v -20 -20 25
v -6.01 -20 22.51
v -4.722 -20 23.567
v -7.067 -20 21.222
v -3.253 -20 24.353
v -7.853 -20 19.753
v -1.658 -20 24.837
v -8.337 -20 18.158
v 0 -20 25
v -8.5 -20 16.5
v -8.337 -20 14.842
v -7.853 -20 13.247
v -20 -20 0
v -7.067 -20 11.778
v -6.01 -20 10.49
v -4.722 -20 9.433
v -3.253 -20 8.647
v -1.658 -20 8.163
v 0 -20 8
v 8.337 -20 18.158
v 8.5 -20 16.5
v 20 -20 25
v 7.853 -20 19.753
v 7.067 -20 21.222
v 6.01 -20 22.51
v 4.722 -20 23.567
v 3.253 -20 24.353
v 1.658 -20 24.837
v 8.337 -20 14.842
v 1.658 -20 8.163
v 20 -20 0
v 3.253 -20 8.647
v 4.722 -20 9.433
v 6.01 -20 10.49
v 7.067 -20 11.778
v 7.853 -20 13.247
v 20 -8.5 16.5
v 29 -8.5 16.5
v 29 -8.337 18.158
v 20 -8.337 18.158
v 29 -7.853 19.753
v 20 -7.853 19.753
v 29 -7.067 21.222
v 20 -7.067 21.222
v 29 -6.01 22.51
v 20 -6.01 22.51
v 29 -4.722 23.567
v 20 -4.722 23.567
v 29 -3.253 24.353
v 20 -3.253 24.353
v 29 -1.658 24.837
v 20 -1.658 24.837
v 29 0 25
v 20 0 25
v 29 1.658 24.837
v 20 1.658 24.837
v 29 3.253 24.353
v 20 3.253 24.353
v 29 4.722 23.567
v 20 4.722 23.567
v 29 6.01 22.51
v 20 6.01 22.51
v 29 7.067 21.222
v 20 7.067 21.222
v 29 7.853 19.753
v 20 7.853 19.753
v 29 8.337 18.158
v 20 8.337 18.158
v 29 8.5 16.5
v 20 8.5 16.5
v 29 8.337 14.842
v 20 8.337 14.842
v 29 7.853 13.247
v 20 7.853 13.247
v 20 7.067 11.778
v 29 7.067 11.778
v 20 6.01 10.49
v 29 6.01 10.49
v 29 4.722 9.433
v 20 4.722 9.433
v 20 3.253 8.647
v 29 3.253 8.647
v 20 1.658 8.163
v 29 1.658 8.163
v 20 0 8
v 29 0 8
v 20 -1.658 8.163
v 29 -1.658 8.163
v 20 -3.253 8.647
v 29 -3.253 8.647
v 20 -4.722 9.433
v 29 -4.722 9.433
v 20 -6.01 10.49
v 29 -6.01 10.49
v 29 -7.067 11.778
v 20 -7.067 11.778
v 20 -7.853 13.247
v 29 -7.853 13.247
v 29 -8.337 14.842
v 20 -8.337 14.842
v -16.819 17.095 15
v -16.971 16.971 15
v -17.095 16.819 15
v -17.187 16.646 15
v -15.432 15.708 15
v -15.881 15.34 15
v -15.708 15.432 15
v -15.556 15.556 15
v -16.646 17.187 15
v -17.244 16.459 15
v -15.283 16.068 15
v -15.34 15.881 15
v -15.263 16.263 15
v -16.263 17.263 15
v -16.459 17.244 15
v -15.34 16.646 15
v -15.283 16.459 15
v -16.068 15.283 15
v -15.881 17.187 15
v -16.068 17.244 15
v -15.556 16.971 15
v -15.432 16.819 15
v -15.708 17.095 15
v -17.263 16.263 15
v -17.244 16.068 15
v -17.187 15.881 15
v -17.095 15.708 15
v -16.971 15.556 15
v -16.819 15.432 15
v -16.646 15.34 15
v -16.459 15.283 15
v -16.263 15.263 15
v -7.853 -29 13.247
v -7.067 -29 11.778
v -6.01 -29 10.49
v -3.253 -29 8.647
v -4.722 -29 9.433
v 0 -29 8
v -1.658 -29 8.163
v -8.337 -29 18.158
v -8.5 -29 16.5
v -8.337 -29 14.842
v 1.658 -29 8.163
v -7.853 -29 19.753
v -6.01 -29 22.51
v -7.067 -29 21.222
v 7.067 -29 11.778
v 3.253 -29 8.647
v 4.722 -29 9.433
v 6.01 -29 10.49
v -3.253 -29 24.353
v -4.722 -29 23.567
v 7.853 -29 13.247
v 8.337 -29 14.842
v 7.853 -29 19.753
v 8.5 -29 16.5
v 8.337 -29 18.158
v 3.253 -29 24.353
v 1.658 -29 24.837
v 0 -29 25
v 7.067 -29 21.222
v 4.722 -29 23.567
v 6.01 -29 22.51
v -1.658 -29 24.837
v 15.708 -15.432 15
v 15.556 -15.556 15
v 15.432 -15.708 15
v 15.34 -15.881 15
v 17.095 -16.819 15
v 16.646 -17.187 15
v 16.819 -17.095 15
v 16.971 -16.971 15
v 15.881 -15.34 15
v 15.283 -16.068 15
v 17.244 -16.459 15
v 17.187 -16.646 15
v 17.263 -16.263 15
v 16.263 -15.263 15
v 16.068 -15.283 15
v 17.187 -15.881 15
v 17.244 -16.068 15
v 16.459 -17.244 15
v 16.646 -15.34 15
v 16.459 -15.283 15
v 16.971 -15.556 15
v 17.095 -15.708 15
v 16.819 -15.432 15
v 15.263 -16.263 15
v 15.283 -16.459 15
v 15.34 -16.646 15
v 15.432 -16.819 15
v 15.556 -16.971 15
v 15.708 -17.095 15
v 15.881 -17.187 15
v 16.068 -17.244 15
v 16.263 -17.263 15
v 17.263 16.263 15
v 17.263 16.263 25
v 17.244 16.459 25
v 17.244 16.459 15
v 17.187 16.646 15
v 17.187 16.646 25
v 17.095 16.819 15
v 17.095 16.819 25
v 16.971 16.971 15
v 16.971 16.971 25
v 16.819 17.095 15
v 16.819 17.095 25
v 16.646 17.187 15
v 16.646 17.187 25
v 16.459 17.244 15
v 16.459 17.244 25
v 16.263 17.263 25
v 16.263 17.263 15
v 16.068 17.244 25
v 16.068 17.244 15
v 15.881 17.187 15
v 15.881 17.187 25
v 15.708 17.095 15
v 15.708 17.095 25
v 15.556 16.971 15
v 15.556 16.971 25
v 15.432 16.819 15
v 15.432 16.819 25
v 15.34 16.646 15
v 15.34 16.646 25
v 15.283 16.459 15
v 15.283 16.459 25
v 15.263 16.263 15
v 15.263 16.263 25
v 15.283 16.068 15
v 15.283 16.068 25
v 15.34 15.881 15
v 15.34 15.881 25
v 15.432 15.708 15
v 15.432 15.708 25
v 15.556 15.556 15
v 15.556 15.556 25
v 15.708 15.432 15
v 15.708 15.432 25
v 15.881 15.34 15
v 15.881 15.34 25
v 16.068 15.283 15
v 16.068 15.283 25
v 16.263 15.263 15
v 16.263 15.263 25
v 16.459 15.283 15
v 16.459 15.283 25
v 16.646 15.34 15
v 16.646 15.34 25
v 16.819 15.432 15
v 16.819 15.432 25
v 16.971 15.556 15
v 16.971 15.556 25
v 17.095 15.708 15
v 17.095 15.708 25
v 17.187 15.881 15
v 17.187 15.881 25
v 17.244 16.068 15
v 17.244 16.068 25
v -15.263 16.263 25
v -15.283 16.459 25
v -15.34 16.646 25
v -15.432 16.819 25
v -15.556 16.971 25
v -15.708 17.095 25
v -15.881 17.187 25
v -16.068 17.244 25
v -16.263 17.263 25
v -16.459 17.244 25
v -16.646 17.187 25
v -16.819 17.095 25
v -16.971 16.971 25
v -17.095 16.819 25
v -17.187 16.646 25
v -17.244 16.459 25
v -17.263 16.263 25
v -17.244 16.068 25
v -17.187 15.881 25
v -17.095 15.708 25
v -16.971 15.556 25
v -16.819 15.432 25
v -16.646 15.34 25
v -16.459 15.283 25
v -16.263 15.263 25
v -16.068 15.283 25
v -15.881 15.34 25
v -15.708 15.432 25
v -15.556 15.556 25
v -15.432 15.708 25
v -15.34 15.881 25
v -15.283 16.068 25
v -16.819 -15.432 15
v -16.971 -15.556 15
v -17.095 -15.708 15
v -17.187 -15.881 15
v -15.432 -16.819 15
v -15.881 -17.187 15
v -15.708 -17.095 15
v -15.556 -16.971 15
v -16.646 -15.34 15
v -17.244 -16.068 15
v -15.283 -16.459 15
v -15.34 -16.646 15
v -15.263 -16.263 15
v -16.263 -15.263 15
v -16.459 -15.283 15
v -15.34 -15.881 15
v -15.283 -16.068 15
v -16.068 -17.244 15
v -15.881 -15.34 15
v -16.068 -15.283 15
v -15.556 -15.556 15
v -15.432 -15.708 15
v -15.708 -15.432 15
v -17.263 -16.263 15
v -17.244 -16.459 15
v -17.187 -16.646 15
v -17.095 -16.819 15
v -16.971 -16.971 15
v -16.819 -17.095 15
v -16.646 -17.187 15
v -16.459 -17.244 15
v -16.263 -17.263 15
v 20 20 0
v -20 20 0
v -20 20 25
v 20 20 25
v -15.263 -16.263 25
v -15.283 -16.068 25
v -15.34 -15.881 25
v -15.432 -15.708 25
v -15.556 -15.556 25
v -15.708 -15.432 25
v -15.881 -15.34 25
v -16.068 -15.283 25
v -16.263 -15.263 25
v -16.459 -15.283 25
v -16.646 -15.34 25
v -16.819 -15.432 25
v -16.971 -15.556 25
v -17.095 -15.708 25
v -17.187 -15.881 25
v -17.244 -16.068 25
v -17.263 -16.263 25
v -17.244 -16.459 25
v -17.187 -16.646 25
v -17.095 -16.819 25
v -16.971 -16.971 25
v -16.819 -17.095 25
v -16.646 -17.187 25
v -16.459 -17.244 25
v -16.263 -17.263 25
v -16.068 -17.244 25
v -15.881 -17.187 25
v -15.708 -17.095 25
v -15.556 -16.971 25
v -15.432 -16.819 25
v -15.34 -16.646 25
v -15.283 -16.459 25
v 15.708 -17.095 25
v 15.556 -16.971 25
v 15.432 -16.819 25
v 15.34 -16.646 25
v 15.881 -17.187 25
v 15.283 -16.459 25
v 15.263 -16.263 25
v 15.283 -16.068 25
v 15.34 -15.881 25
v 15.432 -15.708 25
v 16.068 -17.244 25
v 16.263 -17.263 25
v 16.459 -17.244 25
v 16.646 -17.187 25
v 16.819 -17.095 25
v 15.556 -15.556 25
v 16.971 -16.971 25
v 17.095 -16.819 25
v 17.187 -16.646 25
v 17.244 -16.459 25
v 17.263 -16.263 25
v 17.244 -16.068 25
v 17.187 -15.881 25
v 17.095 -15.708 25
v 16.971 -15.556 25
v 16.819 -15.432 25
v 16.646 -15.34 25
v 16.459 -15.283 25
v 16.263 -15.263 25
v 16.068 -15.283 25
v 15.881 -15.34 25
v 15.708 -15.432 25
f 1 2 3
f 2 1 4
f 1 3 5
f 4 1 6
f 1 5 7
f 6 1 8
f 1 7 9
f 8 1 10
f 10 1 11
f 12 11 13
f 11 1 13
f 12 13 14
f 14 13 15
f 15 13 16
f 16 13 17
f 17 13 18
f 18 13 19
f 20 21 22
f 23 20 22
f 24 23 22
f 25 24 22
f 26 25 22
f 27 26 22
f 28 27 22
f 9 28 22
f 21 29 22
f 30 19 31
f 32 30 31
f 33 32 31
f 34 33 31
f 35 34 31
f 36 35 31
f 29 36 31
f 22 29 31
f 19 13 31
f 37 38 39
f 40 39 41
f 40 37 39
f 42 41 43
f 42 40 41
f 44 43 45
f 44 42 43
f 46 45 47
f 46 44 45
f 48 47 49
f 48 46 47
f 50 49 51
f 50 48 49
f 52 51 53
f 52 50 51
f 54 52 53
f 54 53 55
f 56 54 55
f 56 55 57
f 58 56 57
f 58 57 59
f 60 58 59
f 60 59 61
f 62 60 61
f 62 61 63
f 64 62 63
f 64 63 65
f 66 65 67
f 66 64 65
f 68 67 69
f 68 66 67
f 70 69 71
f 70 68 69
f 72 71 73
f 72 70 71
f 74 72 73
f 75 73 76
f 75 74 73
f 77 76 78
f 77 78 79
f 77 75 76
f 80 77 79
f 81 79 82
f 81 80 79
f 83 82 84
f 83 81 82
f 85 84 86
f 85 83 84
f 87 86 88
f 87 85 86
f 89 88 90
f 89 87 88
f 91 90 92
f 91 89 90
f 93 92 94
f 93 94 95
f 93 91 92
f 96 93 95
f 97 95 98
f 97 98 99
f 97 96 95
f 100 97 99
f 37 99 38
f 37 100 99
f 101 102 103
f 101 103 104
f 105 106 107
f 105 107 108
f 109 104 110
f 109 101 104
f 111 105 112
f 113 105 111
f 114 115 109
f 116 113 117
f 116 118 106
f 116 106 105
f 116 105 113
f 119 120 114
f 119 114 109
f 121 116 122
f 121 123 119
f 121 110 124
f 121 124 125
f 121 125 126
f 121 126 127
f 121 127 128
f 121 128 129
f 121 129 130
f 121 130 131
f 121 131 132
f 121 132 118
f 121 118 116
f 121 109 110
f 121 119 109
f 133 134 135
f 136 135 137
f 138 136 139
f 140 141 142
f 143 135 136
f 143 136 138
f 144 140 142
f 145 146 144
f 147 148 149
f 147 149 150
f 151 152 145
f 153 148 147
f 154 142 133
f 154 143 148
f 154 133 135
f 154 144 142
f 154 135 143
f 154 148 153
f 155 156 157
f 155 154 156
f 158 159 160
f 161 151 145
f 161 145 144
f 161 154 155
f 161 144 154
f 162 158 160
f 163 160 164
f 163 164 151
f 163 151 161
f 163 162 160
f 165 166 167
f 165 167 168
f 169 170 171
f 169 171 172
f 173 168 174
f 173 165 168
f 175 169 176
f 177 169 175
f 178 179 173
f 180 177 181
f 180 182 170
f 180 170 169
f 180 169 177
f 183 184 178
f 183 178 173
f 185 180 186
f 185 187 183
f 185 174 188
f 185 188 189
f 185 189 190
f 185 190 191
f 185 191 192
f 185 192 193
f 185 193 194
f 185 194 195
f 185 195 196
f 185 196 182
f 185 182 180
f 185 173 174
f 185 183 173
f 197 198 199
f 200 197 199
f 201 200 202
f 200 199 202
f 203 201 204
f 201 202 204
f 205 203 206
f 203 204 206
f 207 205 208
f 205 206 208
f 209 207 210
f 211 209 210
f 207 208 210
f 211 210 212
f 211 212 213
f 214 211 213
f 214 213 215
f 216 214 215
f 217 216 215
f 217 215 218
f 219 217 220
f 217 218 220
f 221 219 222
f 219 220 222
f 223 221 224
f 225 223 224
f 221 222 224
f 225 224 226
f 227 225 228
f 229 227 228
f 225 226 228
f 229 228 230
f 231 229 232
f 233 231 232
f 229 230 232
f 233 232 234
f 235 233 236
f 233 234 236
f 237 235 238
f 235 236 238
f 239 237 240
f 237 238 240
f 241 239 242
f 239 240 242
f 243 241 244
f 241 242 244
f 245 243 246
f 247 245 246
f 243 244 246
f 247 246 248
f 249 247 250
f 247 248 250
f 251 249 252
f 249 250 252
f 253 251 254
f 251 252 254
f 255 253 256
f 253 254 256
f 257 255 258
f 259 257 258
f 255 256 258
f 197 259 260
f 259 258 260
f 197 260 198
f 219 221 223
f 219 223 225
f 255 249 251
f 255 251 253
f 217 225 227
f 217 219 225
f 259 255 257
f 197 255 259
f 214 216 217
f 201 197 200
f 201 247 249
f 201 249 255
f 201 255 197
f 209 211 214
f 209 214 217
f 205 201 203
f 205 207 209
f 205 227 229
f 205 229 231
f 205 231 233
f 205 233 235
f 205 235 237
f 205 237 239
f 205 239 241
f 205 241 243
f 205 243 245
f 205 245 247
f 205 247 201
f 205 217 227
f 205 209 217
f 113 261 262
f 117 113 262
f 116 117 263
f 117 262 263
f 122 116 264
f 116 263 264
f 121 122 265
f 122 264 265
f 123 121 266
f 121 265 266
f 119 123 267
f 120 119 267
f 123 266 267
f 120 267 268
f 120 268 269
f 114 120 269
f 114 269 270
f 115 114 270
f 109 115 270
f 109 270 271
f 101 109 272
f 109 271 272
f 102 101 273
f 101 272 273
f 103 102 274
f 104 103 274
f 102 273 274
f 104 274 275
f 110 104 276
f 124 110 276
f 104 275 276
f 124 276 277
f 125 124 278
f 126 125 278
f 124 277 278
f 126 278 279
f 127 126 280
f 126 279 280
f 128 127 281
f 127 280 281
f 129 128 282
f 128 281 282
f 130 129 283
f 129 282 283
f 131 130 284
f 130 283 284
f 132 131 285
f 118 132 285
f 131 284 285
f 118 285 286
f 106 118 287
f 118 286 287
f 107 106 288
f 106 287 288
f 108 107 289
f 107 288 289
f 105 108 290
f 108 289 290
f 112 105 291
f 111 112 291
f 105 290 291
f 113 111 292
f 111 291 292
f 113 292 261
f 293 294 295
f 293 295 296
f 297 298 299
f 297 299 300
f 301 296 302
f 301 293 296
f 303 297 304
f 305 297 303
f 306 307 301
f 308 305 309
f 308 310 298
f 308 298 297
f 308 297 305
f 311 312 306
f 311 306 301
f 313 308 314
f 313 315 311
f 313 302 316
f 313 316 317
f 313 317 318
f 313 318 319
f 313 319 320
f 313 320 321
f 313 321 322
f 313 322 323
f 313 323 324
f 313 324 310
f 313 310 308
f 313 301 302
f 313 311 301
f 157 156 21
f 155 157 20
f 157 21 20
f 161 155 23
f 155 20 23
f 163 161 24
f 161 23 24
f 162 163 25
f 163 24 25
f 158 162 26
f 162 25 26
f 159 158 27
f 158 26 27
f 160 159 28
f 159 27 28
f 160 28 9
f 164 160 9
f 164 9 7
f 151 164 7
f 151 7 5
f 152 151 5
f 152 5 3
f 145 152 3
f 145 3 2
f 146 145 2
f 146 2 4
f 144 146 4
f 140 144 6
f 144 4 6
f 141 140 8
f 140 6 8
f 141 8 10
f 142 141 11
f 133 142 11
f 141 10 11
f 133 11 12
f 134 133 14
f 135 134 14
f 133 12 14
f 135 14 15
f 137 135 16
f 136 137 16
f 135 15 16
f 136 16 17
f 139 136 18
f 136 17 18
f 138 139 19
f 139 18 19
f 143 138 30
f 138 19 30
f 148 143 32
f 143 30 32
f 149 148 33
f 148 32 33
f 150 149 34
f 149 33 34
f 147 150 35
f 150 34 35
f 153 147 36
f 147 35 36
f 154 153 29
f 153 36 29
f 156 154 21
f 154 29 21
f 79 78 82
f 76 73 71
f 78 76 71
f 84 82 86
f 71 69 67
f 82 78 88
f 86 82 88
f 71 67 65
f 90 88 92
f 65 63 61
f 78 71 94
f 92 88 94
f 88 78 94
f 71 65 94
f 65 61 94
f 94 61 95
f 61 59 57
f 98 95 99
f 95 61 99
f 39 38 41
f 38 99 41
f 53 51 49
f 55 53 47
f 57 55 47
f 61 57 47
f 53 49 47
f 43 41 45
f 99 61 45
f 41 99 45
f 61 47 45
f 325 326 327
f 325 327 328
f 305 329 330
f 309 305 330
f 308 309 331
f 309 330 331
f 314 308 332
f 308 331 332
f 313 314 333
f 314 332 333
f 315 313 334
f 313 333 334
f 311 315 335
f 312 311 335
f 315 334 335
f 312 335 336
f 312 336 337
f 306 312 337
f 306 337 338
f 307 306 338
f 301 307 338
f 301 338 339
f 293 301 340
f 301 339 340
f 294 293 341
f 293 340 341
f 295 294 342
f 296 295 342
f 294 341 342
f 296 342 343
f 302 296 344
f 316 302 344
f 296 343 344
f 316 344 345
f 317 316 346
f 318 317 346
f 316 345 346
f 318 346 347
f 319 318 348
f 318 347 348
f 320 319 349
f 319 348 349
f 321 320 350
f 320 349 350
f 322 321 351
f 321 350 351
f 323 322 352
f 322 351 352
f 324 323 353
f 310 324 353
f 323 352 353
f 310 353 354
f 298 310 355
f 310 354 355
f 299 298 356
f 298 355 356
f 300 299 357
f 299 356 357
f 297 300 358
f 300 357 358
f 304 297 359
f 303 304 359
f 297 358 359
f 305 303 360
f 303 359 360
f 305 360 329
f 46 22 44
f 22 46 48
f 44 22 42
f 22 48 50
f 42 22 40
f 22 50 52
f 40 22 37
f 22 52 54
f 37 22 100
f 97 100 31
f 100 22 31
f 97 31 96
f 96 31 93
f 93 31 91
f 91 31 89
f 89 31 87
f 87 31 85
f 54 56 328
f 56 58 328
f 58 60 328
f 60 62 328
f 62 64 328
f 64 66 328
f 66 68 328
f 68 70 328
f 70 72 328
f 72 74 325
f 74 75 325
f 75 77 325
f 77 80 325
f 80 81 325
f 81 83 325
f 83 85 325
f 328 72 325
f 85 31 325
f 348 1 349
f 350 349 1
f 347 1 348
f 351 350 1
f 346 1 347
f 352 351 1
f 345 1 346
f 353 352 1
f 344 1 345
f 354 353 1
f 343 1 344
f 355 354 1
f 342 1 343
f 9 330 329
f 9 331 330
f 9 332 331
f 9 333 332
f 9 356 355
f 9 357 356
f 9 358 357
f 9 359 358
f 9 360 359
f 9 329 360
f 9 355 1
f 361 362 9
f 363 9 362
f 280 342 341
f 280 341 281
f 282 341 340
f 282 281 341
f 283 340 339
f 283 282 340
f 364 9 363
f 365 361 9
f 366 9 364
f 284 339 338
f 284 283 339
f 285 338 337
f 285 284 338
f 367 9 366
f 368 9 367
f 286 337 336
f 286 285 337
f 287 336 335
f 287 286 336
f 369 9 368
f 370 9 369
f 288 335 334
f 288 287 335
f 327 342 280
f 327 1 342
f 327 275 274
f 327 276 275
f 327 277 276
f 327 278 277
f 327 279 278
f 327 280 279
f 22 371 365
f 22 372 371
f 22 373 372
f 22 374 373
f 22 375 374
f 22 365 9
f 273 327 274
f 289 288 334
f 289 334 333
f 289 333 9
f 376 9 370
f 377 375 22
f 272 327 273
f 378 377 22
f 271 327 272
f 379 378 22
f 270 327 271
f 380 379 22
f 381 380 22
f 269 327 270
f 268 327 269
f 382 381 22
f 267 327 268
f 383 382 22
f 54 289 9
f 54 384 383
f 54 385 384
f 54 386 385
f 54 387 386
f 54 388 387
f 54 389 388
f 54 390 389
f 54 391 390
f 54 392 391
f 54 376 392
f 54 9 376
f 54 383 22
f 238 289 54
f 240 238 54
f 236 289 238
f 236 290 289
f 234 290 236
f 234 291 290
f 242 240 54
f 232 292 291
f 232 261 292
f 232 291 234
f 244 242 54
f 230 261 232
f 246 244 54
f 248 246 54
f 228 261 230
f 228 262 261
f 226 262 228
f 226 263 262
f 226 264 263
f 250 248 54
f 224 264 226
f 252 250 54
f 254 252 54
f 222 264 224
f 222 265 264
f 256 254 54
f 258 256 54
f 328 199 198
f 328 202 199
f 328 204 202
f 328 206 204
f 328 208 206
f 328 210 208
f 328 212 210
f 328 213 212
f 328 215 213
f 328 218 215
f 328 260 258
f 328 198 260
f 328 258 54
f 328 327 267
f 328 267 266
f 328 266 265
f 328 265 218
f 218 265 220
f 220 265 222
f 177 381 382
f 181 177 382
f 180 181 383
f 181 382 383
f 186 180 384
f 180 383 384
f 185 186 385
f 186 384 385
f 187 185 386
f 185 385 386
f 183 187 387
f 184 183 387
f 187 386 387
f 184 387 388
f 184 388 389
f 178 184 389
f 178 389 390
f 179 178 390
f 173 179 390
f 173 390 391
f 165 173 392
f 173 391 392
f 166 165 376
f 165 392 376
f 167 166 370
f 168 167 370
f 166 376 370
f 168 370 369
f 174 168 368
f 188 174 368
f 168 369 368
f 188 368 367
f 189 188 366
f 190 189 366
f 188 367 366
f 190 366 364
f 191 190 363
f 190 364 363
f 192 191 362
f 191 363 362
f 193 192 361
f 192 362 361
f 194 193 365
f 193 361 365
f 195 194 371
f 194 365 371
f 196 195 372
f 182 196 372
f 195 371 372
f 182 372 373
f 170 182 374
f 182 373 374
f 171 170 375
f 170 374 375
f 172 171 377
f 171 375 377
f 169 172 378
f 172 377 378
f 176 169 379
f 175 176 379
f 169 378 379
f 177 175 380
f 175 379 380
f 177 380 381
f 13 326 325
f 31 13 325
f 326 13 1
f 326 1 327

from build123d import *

# Parameters (mm, degrees)
SKETCH1_W           = 40
SKETCH1_H           = 40
BOSS_EXTRUDE1_DEPTH = 25
SKETCH2_R           = 8.5
BOSS_EXTRUDE2_DEPTH = 9
SKETCH3_R           = 1
CUT_EXTRUDE1_DEPTH  = 10


with BuildPart() as part:
    # Sketch1 → Boss-Extrude1 (new body)
    with BuildSketch(Plane.XY):
        Rectangle(SKETCH1_W, SKETCH1_H)
    extrude(amount=BOSS_EXTRUDE1_DEPTH)

    # Sketch2 → Boss-Extrude2 (add)
    with BuildSketch(Plane.XZ.offset(20)):
        with Locations((0, 16.5)):
            Circle(SKETCH2_R)
    boss_extrude2 = extrude(amount=BOSS_EXTRUDE2_DEPTH)

    # Mirror1: Boss-Extrude2 across plane
    add(boss_extrude2.mirror(Plane(origin=(0, 0, 0), x_dir=(0, 0, 1), z_dir=(0.707106781, 0.707106781, 0))))

    # Sketch3 → Cut-Extrude1 (cut)
    with BuildSketch(Plane.XY.offset(25)):
        with Locations((-16.263455967, 16.263455967)):
            Circle(SKETCH3_R)
        with Locations((16.263455967, 16.263455967)):
            Circle(SKETCH3_R)
        with Locations((-16.263455967, -16.263455967)):
            Circle(SKETCH3_R)
        with Locations((16.263455967, -16.263455967)):
            Circle(SKETCH3_R)
    extrude(amount=-CUT_EXTRUDE1_DEPTH, mode=Mode.SUBTRACT)


solid = part.part
